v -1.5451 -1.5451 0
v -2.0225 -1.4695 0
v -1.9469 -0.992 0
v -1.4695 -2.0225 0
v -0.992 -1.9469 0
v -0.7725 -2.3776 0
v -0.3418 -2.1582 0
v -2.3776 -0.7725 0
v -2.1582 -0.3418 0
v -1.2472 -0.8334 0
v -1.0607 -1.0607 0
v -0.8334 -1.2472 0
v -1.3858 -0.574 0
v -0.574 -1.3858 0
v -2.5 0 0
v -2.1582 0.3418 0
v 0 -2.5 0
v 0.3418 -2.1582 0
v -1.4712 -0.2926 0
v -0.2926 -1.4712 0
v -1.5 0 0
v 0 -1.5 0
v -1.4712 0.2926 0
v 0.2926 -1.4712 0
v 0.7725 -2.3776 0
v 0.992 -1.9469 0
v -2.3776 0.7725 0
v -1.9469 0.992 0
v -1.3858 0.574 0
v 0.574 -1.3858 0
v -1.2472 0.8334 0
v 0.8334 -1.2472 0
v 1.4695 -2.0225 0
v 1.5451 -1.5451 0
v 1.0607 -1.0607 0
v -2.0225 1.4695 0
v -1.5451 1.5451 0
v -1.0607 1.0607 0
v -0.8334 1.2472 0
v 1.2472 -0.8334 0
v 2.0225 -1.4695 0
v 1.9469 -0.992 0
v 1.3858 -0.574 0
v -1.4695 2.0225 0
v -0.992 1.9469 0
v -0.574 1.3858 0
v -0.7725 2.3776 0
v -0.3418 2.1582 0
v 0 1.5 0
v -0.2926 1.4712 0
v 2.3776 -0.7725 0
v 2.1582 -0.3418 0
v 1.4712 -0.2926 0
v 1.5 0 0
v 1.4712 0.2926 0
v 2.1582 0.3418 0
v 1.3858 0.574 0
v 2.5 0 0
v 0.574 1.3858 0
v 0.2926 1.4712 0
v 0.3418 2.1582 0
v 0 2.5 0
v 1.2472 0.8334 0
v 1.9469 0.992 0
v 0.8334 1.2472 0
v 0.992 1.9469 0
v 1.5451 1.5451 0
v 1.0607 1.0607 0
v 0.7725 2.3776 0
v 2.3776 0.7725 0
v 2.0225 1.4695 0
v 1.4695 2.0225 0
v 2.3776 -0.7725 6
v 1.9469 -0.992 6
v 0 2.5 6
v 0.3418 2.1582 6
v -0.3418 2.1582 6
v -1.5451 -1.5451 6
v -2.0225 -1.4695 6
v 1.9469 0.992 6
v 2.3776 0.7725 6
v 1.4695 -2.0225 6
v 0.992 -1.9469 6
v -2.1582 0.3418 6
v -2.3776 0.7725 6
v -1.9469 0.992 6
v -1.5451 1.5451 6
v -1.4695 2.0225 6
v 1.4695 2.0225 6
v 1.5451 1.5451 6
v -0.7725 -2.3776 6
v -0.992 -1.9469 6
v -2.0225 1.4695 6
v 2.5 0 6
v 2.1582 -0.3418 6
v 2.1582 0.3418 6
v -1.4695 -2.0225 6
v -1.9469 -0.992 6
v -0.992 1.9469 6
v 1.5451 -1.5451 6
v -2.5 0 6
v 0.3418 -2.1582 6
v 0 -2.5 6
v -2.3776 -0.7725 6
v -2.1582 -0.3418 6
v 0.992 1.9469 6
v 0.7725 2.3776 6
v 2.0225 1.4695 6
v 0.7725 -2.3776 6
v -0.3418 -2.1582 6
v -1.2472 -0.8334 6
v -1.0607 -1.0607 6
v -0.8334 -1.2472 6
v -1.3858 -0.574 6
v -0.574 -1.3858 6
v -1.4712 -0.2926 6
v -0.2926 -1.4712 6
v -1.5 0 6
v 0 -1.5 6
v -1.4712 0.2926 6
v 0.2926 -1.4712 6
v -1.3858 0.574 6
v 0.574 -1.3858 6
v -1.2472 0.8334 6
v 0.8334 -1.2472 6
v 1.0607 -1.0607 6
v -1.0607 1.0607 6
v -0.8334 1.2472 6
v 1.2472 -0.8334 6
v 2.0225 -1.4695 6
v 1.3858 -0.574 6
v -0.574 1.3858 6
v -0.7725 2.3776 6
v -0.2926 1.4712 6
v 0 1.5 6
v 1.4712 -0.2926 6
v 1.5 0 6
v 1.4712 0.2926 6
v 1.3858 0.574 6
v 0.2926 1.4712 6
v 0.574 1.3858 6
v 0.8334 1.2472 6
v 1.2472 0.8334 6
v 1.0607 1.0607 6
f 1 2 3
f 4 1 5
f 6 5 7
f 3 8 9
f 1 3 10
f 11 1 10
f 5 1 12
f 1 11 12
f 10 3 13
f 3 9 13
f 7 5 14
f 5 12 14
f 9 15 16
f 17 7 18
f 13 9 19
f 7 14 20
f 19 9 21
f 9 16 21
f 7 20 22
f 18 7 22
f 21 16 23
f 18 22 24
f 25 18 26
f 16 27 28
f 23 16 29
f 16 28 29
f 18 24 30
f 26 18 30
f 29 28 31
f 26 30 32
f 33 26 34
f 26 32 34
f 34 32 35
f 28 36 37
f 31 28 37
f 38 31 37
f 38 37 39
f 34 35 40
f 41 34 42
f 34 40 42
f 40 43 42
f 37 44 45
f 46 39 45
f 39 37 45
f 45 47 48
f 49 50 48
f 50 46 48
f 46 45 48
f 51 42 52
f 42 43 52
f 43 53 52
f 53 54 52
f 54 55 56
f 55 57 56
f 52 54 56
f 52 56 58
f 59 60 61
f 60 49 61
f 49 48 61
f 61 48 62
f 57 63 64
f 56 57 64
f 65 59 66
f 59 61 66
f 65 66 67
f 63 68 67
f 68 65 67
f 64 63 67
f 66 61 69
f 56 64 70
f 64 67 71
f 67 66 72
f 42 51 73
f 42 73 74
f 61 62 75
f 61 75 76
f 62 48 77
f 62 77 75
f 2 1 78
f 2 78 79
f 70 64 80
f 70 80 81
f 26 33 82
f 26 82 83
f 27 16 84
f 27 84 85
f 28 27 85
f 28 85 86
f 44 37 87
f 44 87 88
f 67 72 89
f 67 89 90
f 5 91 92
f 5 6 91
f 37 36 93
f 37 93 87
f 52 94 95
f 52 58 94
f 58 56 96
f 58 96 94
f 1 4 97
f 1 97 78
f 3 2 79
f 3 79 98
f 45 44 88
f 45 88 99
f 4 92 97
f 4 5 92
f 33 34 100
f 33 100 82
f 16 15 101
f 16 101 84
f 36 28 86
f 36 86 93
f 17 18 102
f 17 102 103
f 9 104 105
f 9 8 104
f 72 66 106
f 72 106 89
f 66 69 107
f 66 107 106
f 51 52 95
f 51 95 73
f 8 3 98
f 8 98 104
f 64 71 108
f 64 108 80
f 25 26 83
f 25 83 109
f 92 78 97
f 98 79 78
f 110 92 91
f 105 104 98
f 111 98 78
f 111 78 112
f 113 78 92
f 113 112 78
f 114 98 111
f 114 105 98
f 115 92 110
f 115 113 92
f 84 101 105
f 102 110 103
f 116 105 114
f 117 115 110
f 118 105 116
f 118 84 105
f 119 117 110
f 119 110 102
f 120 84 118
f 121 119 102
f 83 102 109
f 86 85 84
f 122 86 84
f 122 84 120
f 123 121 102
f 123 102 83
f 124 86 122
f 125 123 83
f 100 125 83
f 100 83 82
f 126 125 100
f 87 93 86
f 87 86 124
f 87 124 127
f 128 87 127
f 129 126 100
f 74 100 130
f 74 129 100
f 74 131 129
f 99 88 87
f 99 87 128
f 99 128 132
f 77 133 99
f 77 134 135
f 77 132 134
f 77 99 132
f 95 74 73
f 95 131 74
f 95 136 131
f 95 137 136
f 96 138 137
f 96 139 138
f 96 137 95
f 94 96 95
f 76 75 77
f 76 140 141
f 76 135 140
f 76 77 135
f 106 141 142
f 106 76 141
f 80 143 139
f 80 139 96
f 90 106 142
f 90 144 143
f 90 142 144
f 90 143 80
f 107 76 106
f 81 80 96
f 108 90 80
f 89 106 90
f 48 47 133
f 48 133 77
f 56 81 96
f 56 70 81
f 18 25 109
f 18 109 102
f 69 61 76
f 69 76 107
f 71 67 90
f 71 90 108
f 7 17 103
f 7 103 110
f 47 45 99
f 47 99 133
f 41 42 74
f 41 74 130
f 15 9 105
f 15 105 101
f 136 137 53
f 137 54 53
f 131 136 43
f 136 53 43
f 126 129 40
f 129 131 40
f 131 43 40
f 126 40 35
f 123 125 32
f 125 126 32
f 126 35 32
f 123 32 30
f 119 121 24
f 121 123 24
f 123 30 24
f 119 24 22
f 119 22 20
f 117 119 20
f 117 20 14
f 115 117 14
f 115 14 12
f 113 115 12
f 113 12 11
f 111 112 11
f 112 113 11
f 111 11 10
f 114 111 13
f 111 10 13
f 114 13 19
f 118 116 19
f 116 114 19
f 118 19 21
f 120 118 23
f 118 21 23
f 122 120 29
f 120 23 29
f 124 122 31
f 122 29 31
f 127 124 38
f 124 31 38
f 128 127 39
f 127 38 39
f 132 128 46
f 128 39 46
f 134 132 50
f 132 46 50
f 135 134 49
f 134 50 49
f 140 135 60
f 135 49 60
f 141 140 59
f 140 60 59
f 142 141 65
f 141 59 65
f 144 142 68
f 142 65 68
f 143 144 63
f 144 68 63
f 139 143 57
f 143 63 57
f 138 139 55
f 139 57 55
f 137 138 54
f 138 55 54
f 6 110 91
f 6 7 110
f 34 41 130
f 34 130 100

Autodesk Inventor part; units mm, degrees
ref_plane "YZ Plane" through (0, 0, 0) normal (1, 0, 0) x (0, 1, 0)
ref_plane "XZ Plane" through (0, 0, 0) normal (0, 1, 0) x (-1, 0, 0)
ref_plane "XY Plane" through (0, 0, 0) normal (0, 0, 1) x (1, 0, 0)
sketch "Sketch1" plane through (0, 0, 0) normal (0, 0, 1) x (1, 0, 0)
  circle A0 centre (0, 0) radius 1.5
  circle A1 centre (0, 0) radius 2.5 construction
  circle A2 centre (0, 0) radius 1.9
  line L0 (-0.7576, 1.7424) -> (0, 2.5)
  line L1 (0, 2.5) -> (0.7576, 1.7424)
  line L2 (0, 2.5) -> (0, 0) construction
  line L3 (-1.2589, 1.4231) -> (-0.7725, 2.3776)
  line L4 (-0.7725, 2.3776) -> (0.182, 1.8913)
  line L5 (-1.6371, 0.9644) -> (-1.4695, 2.0225)
  line L6 (-1.4695, 2.0225) -> (-0.4113, 1.8549)
  line L7 (-1.8549, 0.4113) -> (-2.0225, 1.4695)
  line L8 (-2.0225, 1.4695) -> (-0.9644, 1.6371)
  line L9 (-1.8913, -0.182) -> (-2.3776, 0.7725)
  line L10 (-2.3776, 0.7725) -> (-1.4231, 1.2589)
  line L11 (-1.7424, -0.7576) -> (-2.5, 0)
  line L12 (-2.5, 0) -> (-1.7424, 0.7576)
  line L13 (-1.4231, -1.2589) -> (-2.3776, -0.7725)
  line L14 (-2.3776, -0.7725) -> (-1.8913, 0.182)
  line L15 (-0.9644, -1.6371) -> (-2.0225, -1.4695)
  line L16 (-2.0225, -1.4695) -> (-1.8549, -0.4113)
  line L17 (-0.4113, -1.8549) -> (-1.4695, -2.0225)
  line L18 (-1.4695, -2.0225) -> (-1.6371, -0.9644)
  line L19 (0.182, -1.8913) -> (-0.7725, -2.3776)
  line L20 (-0.7725, -2.3776) -> (-1.2589, -1.4231)
  line L21 (0.7576, -1.7424) -> (0, -2.5)
  line L22 (0, -2.5) -> (-0.7576, -1.7424)
  line L23 (1.2589, -1.4231) -> (0.7725, -2.3776)
  line L24 (0.7725, -2.3776) -> (-0.182, -1.8913)
  line L25 (1.6371, -0.9644) -> (1.4695, -2.0225)
  line L26 (1.4695, -2.0225) -> (0.4113, -1.8549)
  line L27 (1.8549, -0.4113) -> (2.0225, -1.4695)
  line L28 (2.0225, -1.4695) -> (0.9644, -1.6371)
  line L29 (1.8913, 0.182) -> (2.3776, -0.7725)
  line L30 (2.3776, -0.7725) -> (1.4231, -1.2589)
  line L31 (1.7424, 0.7576) -> (2.5, 0)
  line L32 (2.5, 0) -> (1.7424, -0.7576)
  line L33 (1.4231, 1.2589) -> (2.3776, 0.7725)
  line L34 (2.3776, 0.7725) -> (1.8913, -0.182)
  line L35 (0.9644, 1.6371) -> (2.0225, 1.4695)
  line L36 (2.0225, 1.4695) -> (1.8549, 0.4113)
  line L37 (0.4113, 1.8549) -> (1.4695, 2.0225)
  line L38 (1.4695, 2.0225) -> (1.6371, 0.9644)
  line L39 (-0.182, 1.8913) -> (0.7725, 2.3776)
  line L40 (0.7725, 2.3776) -> (1.2589, 1.4231)
  point P0 (-0.992, 1.9469)
  point P1 (-1.5451, 1.5451)
  point P2 (-1.9469, 0.992)
  point P3 (-2.1582, 0.3418)
  point P4 (-2.1582, -0.3418)
  point P5 (-1.9469, -0.992)
  point P6 (-1.5451, -1.5451)
  point P7 (-0.992, -1.9469)
  point P8 (-0.3418, -2.1582)
  point P9 (0.3418, -2.1582)
  point P10 (0.992, -1.9469)
  point P11 (1.5451, -1.5451)
  point P12 (1.9469, -0.992)
  point P13 (2.1582, -0.3418)
  point P14 (2.1582, 0.3418)
  point P15 (1.9469, 0.992)
  point P16 (1.5451, 1.5451)
  point P17 (0.992, 1.9469)
  point P18 (0.3418, 2.1582)
  point P19 (-0.3418, 2.1582)
  dimension "d1" = 5
  dimension "d0" = 3
  dimension "d2" = 0.4
  dimension "d5" = 360
extrude "Extrusion1" add sketch "Sketch1" along normal blind 6
properties part number "fancy spacer"
